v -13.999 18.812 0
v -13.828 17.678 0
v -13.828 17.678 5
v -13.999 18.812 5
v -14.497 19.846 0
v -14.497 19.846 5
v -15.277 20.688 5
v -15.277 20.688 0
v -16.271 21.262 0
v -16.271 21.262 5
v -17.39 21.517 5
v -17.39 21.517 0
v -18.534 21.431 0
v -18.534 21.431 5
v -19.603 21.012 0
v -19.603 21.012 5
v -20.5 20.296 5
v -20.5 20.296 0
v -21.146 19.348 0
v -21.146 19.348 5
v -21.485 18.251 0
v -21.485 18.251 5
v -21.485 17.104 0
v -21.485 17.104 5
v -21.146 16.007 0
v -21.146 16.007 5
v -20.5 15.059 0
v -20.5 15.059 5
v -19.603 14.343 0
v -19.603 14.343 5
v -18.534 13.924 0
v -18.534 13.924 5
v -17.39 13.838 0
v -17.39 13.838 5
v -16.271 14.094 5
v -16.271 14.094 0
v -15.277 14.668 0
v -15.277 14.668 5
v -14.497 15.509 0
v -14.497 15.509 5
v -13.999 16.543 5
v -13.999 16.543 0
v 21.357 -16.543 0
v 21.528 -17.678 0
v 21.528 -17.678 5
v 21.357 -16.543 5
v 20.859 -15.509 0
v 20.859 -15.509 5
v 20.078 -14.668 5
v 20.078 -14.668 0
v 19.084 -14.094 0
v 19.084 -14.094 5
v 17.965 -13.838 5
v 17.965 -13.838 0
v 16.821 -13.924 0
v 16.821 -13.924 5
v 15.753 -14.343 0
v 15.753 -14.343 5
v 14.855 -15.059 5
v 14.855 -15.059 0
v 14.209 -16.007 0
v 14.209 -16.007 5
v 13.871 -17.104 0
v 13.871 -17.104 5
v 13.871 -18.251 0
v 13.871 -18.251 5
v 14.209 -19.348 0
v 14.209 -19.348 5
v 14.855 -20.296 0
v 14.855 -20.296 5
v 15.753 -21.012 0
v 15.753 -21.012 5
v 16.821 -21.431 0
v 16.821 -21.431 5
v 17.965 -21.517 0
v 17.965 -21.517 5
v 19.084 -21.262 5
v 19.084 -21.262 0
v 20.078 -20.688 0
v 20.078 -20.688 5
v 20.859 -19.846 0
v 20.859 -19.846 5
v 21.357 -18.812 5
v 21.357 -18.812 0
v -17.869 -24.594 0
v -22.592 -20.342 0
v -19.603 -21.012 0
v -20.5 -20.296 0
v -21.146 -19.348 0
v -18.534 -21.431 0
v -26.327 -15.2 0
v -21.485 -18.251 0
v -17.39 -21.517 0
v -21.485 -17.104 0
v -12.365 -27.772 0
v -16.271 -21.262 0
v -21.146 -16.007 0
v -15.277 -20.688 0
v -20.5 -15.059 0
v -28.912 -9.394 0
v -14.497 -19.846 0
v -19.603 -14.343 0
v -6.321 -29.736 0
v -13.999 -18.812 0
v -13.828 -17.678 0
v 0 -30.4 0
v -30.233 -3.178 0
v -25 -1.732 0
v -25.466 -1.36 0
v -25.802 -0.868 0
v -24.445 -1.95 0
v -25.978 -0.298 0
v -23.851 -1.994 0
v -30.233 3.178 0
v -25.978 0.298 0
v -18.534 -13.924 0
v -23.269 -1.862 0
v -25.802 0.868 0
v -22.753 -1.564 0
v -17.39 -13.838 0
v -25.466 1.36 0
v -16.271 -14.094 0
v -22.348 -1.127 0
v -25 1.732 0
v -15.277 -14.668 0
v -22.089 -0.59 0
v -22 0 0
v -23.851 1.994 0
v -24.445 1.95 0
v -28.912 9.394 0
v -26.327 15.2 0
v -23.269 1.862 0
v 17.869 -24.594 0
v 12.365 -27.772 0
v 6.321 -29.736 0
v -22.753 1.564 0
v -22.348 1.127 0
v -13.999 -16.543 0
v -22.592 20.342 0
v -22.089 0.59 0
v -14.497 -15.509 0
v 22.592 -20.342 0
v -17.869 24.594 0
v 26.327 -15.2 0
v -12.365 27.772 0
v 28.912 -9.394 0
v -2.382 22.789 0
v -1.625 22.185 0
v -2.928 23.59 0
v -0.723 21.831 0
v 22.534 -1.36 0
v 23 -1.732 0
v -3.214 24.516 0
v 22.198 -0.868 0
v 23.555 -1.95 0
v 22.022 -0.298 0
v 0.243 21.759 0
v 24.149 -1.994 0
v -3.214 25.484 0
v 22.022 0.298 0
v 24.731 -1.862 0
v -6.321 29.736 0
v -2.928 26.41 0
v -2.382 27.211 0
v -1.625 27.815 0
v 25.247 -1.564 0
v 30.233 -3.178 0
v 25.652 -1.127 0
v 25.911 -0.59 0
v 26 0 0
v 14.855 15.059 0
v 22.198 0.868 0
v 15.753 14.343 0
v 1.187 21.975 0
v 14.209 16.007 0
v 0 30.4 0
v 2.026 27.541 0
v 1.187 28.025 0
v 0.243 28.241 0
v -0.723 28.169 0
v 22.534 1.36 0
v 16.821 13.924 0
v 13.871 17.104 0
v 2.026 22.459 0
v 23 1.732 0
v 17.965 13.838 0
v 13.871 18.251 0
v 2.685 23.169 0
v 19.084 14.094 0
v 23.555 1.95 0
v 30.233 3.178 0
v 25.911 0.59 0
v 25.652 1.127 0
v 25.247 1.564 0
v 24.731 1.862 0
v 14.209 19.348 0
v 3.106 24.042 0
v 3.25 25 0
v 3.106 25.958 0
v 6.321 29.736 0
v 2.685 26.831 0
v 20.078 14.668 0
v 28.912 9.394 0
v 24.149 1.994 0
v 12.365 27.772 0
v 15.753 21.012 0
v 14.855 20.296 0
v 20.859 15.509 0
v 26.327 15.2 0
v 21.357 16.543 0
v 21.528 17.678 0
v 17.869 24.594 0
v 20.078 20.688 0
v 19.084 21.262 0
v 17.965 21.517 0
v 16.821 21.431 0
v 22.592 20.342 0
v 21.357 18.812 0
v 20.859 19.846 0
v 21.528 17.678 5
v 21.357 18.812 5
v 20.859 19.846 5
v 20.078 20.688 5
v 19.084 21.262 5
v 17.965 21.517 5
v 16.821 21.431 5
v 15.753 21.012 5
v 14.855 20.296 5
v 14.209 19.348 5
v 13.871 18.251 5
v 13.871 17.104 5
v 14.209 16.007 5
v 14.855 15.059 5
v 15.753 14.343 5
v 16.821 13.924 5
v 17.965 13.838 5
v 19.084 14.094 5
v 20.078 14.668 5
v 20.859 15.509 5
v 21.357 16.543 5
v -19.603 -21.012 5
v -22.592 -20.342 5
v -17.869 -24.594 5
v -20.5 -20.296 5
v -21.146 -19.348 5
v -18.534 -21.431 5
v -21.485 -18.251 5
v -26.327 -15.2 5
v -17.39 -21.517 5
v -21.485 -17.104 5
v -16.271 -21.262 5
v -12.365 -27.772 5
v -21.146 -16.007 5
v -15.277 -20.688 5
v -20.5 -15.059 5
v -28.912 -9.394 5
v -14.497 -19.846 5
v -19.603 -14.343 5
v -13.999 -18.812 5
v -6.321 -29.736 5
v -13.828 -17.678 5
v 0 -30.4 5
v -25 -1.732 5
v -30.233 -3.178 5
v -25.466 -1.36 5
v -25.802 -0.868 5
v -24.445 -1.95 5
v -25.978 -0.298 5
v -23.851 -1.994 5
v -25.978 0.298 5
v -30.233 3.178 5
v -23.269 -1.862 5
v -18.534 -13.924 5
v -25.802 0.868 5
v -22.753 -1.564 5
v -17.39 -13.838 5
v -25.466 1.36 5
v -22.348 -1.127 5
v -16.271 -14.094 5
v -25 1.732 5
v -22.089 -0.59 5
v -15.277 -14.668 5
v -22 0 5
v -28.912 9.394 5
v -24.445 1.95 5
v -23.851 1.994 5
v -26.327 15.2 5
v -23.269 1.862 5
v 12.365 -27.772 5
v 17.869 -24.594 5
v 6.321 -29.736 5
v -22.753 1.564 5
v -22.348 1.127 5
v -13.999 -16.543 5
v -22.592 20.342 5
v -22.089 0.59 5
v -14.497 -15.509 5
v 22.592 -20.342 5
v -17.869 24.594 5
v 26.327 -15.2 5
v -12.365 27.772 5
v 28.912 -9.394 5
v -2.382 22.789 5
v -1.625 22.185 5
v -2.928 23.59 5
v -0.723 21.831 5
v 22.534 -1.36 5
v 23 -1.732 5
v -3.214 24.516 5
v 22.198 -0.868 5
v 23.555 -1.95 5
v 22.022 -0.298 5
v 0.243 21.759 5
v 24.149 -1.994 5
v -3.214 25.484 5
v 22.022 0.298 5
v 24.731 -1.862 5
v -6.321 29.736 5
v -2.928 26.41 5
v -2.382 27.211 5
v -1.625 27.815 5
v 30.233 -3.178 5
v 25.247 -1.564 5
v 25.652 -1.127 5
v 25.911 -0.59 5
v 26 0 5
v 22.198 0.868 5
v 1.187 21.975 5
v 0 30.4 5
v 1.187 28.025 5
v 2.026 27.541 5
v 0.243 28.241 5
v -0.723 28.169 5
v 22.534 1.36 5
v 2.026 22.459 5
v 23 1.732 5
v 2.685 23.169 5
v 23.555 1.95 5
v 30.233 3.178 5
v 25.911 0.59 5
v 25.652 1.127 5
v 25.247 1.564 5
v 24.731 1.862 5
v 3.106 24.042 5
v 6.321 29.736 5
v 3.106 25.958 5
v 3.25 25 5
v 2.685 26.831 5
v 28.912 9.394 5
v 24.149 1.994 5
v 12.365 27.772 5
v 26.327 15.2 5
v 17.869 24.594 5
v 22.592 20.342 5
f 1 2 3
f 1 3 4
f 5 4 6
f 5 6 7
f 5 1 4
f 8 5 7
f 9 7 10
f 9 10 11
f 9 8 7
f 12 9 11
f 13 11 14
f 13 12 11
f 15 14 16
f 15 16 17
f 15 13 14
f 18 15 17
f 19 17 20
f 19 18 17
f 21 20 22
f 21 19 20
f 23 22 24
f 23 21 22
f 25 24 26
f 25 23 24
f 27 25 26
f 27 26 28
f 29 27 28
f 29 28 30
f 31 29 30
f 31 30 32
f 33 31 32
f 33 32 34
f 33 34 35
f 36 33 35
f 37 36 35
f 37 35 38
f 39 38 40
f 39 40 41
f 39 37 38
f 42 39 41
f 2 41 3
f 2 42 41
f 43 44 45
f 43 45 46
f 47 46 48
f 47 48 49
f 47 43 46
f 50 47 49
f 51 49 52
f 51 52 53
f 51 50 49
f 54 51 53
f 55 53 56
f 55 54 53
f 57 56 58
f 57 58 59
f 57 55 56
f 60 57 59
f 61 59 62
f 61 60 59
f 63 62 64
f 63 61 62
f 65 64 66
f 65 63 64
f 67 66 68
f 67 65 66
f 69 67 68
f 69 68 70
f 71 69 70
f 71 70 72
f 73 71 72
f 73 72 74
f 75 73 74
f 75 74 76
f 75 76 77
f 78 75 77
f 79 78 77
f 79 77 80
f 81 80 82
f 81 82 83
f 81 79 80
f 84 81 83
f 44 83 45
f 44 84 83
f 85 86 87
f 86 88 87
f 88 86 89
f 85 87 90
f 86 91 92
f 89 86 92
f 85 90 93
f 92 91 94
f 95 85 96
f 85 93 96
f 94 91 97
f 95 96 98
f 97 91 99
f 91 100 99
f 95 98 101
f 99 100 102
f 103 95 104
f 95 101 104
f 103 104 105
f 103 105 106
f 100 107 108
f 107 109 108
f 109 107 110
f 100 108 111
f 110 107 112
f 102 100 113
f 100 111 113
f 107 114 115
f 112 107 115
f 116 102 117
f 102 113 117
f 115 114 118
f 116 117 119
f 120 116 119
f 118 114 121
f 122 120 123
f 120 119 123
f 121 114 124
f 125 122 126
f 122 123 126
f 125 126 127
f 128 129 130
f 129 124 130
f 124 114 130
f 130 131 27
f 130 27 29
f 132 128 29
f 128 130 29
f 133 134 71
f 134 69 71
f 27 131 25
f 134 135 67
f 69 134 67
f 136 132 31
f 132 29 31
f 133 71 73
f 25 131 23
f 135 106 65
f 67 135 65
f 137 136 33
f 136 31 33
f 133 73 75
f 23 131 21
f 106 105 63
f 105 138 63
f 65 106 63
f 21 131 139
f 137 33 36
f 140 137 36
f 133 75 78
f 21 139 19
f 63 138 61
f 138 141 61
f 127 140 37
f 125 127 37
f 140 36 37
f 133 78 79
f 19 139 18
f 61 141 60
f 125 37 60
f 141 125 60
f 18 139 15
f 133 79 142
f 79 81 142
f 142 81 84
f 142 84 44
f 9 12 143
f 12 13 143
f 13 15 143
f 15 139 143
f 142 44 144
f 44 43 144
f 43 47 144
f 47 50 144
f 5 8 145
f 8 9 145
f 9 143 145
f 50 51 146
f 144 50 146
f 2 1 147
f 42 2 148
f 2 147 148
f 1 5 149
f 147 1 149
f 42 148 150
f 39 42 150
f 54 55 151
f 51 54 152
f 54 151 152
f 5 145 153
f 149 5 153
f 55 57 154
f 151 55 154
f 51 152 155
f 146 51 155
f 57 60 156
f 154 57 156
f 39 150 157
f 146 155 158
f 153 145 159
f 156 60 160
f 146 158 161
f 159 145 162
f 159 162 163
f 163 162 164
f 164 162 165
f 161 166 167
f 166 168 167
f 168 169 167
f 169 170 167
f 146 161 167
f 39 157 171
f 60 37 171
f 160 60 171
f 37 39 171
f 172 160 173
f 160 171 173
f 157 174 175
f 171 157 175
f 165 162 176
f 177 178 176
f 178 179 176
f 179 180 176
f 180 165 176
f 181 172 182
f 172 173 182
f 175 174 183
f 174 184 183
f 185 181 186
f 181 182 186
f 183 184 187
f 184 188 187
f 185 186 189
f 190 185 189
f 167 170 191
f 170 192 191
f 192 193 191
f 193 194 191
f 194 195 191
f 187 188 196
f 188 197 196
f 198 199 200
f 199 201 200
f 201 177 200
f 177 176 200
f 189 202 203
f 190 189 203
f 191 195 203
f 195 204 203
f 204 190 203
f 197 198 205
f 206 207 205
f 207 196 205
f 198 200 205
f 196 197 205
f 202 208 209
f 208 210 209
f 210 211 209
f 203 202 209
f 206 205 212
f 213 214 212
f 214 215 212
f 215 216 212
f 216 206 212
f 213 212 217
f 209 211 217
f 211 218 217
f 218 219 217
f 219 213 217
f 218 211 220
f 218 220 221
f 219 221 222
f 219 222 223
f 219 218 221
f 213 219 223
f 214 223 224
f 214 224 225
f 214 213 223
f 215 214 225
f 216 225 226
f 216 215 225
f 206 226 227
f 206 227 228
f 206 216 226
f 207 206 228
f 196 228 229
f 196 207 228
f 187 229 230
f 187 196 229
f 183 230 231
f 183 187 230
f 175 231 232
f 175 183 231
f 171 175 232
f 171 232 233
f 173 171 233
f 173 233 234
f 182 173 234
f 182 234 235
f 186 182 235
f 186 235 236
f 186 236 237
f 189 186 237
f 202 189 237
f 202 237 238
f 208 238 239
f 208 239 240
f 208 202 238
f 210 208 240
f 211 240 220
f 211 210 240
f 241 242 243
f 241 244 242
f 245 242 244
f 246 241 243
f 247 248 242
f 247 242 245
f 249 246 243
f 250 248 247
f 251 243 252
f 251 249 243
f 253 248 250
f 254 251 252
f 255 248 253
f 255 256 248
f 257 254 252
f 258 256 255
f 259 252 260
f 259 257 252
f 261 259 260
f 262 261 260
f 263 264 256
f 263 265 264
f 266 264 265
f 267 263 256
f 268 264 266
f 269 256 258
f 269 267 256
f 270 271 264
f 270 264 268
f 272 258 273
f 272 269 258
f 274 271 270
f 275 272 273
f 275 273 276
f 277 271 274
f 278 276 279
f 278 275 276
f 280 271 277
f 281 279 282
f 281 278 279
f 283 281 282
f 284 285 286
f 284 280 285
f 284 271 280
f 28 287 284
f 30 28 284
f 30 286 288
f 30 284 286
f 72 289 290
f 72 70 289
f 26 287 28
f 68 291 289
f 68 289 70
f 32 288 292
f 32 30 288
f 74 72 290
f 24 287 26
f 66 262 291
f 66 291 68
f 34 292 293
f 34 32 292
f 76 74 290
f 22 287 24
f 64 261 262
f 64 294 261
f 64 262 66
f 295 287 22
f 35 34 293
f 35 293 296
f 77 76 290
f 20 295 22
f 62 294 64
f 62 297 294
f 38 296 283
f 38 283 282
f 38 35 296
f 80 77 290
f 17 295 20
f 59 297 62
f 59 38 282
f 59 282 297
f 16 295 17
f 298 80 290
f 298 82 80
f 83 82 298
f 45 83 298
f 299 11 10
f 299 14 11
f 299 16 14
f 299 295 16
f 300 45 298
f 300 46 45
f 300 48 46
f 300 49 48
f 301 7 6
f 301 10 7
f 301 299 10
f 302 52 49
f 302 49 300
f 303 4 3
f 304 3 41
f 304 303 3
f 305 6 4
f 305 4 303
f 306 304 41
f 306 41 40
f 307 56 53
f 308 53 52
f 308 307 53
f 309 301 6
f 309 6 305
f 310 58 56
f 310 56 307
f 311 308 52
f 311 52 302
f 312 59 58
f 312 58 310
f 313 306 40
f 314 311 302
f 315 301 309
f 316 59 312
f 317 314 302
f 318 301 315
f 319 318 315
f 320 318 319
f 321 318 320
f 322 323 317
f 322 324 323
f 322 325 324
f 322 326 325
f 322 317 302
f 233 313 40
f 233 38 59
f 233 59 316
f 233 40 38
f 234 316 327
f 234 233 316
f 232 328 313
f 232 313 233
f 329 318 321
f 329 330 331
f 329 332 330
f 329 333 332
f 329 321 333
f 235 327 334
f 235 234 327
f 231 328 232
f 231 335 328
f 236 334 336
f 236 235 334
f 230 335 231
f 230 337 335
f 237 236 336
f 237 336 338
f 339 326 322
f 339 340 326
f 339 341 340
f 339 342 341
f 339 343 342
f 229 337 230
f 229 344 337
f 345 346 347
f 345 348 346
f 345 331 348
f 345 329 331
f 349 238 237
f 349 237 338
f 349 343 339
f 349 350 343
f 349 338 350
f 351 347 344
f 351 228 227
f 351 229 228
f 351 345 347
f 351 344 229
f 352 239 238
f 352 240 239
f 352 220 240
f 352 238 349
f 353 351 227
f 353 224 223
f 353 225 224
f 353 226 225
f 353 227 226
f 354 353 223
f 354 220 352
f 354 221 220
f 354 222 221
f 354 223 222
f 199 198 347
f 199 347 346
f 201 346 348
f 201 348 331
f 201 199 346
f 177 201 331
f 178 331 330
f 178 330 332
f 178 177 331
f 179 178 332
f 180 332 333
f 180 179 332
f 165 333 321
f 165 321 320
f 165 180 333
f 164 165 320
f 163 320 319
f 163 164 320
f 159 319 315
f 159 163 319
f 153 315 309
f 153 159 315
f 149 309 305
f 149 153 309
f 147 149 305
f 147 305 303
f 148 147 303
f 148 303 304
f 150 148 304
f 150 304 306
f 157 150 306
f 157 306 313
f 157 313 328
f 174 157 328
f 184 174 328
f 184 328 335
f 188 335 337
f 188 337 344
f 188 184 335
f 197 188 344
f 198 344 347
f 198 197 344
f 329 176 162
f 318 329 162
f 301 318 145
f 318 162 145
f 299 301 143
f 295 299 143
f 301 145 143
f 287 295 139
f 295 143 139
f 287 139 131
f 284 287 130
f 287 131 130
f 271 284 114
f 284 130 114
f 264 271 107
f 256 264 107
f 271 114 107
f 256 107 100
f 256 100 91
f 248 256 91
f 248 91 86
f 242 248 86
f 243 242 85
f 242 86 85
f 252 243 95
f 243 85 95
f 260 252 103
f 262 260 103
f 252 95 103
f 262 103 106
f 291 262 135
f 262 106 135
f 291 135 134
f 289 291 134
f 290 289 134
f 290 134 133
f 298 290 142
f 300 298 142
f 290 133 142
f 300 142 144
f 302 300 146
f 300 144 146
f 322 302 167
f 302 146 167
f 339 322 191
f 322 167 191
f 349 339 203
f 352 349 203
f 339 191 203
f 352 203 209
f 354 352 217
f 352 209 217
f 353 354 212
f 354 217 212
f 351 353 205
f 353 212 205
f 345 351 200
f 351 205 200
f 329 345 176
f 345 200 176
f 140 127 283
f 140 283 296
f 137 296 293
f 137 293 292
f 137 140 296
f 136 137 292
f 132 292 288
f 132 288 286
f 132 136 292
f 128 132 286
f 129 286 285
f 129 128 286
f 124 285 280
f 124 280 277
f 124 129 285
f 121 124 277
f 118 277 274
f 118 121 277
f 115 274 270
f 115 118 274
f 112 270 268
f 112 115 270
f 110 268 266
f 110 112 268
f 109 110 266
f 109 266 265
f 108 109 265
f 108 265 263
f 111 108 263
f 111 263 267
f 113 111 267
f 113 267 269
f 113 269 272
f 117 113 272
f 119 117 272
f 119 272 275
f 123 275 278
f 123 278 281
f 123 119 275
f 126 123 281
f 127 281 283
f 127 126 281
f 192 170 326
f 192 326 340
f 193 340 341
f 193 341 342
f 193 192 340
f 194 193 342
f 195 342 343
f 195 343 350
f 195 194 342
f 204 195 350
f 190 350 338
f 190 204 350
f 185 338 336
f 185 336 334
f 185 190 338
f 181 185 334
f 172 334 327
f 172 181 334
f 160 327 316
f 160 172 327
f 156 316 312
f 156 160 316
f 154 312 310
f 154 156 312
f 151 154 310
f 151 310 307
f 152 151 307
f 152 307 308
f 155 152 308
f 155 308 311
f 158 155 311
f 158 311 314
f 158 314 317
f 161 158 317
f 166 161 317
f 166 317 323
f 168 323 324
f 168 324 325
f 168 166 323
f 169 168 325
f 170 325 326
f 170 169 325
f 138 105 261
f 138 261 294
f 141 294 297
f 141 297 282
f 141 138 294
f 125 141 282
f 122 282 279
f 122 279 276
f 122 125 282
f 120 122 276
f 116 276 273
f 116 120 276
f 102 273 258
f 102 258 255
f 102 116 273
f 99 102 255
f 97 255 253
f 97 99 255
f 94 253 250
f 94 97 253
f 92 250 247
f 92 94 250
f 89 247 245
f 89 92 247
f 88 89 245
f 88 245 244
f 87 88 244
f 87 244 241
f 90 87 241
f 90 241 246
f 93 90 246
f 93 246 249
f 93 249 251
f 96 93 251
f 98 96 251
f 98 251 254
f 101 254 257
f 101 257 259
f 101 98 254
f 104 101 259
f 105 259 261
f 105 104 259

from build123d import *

# Parameters (mm, degrees)
SKETCH1_R           = 3.25
SKETCH1_R_2         = 3.85
SKETCH1_R_3         = 2
BOSS_EXTRUDE1_DEPTH = 5


with BuildPart() as part:
    # Sketch1 → Boss-Extrude1 (new body)
    with BuildSketch(Plane.XY):
        with BuildLine():
            ThreePointArc((0, -30.4), (30.4, 0), (0, 30.4))
            ThreePointArc((0, 30.4), (-30.4, 0), (0, -30.4))
        make_face()
        with Locations((0, 25)):
            Circle(SKETCH1_R, mode=Mode.SUBTRACT)
        with Locations((17.67766953, 17.67766953)):
            Circle(SKETCH1_R_2, mode=Mode.SUBTRACT)
        with Locations((17.67766953, -17.67766953)):
            Circle(SKETCH1_R_2, mode=Mode.SUBTRACT)
        with Locations((-17.67766953, -17.67766953)):
            Circle(SKETCH1_R_2, mode=Mode.SUBTRACT)
        with Locations((-17.67766953, 17.67766953)):
            Circle(SKETCH1_R_2, mode=Mode.SUBTRACT)
        with Locations((24, 0)):
            Circle(SKETCH1_R_3, mode=Mode.SUBTRACT)
        with Locations((-24, 0)):
            Circle(SKETCH1_R_3, mode=Mode.SUBTRACT)
    extrude(amount=BOSS_EXTRUDE1_DEPTH)


solid = part.part
